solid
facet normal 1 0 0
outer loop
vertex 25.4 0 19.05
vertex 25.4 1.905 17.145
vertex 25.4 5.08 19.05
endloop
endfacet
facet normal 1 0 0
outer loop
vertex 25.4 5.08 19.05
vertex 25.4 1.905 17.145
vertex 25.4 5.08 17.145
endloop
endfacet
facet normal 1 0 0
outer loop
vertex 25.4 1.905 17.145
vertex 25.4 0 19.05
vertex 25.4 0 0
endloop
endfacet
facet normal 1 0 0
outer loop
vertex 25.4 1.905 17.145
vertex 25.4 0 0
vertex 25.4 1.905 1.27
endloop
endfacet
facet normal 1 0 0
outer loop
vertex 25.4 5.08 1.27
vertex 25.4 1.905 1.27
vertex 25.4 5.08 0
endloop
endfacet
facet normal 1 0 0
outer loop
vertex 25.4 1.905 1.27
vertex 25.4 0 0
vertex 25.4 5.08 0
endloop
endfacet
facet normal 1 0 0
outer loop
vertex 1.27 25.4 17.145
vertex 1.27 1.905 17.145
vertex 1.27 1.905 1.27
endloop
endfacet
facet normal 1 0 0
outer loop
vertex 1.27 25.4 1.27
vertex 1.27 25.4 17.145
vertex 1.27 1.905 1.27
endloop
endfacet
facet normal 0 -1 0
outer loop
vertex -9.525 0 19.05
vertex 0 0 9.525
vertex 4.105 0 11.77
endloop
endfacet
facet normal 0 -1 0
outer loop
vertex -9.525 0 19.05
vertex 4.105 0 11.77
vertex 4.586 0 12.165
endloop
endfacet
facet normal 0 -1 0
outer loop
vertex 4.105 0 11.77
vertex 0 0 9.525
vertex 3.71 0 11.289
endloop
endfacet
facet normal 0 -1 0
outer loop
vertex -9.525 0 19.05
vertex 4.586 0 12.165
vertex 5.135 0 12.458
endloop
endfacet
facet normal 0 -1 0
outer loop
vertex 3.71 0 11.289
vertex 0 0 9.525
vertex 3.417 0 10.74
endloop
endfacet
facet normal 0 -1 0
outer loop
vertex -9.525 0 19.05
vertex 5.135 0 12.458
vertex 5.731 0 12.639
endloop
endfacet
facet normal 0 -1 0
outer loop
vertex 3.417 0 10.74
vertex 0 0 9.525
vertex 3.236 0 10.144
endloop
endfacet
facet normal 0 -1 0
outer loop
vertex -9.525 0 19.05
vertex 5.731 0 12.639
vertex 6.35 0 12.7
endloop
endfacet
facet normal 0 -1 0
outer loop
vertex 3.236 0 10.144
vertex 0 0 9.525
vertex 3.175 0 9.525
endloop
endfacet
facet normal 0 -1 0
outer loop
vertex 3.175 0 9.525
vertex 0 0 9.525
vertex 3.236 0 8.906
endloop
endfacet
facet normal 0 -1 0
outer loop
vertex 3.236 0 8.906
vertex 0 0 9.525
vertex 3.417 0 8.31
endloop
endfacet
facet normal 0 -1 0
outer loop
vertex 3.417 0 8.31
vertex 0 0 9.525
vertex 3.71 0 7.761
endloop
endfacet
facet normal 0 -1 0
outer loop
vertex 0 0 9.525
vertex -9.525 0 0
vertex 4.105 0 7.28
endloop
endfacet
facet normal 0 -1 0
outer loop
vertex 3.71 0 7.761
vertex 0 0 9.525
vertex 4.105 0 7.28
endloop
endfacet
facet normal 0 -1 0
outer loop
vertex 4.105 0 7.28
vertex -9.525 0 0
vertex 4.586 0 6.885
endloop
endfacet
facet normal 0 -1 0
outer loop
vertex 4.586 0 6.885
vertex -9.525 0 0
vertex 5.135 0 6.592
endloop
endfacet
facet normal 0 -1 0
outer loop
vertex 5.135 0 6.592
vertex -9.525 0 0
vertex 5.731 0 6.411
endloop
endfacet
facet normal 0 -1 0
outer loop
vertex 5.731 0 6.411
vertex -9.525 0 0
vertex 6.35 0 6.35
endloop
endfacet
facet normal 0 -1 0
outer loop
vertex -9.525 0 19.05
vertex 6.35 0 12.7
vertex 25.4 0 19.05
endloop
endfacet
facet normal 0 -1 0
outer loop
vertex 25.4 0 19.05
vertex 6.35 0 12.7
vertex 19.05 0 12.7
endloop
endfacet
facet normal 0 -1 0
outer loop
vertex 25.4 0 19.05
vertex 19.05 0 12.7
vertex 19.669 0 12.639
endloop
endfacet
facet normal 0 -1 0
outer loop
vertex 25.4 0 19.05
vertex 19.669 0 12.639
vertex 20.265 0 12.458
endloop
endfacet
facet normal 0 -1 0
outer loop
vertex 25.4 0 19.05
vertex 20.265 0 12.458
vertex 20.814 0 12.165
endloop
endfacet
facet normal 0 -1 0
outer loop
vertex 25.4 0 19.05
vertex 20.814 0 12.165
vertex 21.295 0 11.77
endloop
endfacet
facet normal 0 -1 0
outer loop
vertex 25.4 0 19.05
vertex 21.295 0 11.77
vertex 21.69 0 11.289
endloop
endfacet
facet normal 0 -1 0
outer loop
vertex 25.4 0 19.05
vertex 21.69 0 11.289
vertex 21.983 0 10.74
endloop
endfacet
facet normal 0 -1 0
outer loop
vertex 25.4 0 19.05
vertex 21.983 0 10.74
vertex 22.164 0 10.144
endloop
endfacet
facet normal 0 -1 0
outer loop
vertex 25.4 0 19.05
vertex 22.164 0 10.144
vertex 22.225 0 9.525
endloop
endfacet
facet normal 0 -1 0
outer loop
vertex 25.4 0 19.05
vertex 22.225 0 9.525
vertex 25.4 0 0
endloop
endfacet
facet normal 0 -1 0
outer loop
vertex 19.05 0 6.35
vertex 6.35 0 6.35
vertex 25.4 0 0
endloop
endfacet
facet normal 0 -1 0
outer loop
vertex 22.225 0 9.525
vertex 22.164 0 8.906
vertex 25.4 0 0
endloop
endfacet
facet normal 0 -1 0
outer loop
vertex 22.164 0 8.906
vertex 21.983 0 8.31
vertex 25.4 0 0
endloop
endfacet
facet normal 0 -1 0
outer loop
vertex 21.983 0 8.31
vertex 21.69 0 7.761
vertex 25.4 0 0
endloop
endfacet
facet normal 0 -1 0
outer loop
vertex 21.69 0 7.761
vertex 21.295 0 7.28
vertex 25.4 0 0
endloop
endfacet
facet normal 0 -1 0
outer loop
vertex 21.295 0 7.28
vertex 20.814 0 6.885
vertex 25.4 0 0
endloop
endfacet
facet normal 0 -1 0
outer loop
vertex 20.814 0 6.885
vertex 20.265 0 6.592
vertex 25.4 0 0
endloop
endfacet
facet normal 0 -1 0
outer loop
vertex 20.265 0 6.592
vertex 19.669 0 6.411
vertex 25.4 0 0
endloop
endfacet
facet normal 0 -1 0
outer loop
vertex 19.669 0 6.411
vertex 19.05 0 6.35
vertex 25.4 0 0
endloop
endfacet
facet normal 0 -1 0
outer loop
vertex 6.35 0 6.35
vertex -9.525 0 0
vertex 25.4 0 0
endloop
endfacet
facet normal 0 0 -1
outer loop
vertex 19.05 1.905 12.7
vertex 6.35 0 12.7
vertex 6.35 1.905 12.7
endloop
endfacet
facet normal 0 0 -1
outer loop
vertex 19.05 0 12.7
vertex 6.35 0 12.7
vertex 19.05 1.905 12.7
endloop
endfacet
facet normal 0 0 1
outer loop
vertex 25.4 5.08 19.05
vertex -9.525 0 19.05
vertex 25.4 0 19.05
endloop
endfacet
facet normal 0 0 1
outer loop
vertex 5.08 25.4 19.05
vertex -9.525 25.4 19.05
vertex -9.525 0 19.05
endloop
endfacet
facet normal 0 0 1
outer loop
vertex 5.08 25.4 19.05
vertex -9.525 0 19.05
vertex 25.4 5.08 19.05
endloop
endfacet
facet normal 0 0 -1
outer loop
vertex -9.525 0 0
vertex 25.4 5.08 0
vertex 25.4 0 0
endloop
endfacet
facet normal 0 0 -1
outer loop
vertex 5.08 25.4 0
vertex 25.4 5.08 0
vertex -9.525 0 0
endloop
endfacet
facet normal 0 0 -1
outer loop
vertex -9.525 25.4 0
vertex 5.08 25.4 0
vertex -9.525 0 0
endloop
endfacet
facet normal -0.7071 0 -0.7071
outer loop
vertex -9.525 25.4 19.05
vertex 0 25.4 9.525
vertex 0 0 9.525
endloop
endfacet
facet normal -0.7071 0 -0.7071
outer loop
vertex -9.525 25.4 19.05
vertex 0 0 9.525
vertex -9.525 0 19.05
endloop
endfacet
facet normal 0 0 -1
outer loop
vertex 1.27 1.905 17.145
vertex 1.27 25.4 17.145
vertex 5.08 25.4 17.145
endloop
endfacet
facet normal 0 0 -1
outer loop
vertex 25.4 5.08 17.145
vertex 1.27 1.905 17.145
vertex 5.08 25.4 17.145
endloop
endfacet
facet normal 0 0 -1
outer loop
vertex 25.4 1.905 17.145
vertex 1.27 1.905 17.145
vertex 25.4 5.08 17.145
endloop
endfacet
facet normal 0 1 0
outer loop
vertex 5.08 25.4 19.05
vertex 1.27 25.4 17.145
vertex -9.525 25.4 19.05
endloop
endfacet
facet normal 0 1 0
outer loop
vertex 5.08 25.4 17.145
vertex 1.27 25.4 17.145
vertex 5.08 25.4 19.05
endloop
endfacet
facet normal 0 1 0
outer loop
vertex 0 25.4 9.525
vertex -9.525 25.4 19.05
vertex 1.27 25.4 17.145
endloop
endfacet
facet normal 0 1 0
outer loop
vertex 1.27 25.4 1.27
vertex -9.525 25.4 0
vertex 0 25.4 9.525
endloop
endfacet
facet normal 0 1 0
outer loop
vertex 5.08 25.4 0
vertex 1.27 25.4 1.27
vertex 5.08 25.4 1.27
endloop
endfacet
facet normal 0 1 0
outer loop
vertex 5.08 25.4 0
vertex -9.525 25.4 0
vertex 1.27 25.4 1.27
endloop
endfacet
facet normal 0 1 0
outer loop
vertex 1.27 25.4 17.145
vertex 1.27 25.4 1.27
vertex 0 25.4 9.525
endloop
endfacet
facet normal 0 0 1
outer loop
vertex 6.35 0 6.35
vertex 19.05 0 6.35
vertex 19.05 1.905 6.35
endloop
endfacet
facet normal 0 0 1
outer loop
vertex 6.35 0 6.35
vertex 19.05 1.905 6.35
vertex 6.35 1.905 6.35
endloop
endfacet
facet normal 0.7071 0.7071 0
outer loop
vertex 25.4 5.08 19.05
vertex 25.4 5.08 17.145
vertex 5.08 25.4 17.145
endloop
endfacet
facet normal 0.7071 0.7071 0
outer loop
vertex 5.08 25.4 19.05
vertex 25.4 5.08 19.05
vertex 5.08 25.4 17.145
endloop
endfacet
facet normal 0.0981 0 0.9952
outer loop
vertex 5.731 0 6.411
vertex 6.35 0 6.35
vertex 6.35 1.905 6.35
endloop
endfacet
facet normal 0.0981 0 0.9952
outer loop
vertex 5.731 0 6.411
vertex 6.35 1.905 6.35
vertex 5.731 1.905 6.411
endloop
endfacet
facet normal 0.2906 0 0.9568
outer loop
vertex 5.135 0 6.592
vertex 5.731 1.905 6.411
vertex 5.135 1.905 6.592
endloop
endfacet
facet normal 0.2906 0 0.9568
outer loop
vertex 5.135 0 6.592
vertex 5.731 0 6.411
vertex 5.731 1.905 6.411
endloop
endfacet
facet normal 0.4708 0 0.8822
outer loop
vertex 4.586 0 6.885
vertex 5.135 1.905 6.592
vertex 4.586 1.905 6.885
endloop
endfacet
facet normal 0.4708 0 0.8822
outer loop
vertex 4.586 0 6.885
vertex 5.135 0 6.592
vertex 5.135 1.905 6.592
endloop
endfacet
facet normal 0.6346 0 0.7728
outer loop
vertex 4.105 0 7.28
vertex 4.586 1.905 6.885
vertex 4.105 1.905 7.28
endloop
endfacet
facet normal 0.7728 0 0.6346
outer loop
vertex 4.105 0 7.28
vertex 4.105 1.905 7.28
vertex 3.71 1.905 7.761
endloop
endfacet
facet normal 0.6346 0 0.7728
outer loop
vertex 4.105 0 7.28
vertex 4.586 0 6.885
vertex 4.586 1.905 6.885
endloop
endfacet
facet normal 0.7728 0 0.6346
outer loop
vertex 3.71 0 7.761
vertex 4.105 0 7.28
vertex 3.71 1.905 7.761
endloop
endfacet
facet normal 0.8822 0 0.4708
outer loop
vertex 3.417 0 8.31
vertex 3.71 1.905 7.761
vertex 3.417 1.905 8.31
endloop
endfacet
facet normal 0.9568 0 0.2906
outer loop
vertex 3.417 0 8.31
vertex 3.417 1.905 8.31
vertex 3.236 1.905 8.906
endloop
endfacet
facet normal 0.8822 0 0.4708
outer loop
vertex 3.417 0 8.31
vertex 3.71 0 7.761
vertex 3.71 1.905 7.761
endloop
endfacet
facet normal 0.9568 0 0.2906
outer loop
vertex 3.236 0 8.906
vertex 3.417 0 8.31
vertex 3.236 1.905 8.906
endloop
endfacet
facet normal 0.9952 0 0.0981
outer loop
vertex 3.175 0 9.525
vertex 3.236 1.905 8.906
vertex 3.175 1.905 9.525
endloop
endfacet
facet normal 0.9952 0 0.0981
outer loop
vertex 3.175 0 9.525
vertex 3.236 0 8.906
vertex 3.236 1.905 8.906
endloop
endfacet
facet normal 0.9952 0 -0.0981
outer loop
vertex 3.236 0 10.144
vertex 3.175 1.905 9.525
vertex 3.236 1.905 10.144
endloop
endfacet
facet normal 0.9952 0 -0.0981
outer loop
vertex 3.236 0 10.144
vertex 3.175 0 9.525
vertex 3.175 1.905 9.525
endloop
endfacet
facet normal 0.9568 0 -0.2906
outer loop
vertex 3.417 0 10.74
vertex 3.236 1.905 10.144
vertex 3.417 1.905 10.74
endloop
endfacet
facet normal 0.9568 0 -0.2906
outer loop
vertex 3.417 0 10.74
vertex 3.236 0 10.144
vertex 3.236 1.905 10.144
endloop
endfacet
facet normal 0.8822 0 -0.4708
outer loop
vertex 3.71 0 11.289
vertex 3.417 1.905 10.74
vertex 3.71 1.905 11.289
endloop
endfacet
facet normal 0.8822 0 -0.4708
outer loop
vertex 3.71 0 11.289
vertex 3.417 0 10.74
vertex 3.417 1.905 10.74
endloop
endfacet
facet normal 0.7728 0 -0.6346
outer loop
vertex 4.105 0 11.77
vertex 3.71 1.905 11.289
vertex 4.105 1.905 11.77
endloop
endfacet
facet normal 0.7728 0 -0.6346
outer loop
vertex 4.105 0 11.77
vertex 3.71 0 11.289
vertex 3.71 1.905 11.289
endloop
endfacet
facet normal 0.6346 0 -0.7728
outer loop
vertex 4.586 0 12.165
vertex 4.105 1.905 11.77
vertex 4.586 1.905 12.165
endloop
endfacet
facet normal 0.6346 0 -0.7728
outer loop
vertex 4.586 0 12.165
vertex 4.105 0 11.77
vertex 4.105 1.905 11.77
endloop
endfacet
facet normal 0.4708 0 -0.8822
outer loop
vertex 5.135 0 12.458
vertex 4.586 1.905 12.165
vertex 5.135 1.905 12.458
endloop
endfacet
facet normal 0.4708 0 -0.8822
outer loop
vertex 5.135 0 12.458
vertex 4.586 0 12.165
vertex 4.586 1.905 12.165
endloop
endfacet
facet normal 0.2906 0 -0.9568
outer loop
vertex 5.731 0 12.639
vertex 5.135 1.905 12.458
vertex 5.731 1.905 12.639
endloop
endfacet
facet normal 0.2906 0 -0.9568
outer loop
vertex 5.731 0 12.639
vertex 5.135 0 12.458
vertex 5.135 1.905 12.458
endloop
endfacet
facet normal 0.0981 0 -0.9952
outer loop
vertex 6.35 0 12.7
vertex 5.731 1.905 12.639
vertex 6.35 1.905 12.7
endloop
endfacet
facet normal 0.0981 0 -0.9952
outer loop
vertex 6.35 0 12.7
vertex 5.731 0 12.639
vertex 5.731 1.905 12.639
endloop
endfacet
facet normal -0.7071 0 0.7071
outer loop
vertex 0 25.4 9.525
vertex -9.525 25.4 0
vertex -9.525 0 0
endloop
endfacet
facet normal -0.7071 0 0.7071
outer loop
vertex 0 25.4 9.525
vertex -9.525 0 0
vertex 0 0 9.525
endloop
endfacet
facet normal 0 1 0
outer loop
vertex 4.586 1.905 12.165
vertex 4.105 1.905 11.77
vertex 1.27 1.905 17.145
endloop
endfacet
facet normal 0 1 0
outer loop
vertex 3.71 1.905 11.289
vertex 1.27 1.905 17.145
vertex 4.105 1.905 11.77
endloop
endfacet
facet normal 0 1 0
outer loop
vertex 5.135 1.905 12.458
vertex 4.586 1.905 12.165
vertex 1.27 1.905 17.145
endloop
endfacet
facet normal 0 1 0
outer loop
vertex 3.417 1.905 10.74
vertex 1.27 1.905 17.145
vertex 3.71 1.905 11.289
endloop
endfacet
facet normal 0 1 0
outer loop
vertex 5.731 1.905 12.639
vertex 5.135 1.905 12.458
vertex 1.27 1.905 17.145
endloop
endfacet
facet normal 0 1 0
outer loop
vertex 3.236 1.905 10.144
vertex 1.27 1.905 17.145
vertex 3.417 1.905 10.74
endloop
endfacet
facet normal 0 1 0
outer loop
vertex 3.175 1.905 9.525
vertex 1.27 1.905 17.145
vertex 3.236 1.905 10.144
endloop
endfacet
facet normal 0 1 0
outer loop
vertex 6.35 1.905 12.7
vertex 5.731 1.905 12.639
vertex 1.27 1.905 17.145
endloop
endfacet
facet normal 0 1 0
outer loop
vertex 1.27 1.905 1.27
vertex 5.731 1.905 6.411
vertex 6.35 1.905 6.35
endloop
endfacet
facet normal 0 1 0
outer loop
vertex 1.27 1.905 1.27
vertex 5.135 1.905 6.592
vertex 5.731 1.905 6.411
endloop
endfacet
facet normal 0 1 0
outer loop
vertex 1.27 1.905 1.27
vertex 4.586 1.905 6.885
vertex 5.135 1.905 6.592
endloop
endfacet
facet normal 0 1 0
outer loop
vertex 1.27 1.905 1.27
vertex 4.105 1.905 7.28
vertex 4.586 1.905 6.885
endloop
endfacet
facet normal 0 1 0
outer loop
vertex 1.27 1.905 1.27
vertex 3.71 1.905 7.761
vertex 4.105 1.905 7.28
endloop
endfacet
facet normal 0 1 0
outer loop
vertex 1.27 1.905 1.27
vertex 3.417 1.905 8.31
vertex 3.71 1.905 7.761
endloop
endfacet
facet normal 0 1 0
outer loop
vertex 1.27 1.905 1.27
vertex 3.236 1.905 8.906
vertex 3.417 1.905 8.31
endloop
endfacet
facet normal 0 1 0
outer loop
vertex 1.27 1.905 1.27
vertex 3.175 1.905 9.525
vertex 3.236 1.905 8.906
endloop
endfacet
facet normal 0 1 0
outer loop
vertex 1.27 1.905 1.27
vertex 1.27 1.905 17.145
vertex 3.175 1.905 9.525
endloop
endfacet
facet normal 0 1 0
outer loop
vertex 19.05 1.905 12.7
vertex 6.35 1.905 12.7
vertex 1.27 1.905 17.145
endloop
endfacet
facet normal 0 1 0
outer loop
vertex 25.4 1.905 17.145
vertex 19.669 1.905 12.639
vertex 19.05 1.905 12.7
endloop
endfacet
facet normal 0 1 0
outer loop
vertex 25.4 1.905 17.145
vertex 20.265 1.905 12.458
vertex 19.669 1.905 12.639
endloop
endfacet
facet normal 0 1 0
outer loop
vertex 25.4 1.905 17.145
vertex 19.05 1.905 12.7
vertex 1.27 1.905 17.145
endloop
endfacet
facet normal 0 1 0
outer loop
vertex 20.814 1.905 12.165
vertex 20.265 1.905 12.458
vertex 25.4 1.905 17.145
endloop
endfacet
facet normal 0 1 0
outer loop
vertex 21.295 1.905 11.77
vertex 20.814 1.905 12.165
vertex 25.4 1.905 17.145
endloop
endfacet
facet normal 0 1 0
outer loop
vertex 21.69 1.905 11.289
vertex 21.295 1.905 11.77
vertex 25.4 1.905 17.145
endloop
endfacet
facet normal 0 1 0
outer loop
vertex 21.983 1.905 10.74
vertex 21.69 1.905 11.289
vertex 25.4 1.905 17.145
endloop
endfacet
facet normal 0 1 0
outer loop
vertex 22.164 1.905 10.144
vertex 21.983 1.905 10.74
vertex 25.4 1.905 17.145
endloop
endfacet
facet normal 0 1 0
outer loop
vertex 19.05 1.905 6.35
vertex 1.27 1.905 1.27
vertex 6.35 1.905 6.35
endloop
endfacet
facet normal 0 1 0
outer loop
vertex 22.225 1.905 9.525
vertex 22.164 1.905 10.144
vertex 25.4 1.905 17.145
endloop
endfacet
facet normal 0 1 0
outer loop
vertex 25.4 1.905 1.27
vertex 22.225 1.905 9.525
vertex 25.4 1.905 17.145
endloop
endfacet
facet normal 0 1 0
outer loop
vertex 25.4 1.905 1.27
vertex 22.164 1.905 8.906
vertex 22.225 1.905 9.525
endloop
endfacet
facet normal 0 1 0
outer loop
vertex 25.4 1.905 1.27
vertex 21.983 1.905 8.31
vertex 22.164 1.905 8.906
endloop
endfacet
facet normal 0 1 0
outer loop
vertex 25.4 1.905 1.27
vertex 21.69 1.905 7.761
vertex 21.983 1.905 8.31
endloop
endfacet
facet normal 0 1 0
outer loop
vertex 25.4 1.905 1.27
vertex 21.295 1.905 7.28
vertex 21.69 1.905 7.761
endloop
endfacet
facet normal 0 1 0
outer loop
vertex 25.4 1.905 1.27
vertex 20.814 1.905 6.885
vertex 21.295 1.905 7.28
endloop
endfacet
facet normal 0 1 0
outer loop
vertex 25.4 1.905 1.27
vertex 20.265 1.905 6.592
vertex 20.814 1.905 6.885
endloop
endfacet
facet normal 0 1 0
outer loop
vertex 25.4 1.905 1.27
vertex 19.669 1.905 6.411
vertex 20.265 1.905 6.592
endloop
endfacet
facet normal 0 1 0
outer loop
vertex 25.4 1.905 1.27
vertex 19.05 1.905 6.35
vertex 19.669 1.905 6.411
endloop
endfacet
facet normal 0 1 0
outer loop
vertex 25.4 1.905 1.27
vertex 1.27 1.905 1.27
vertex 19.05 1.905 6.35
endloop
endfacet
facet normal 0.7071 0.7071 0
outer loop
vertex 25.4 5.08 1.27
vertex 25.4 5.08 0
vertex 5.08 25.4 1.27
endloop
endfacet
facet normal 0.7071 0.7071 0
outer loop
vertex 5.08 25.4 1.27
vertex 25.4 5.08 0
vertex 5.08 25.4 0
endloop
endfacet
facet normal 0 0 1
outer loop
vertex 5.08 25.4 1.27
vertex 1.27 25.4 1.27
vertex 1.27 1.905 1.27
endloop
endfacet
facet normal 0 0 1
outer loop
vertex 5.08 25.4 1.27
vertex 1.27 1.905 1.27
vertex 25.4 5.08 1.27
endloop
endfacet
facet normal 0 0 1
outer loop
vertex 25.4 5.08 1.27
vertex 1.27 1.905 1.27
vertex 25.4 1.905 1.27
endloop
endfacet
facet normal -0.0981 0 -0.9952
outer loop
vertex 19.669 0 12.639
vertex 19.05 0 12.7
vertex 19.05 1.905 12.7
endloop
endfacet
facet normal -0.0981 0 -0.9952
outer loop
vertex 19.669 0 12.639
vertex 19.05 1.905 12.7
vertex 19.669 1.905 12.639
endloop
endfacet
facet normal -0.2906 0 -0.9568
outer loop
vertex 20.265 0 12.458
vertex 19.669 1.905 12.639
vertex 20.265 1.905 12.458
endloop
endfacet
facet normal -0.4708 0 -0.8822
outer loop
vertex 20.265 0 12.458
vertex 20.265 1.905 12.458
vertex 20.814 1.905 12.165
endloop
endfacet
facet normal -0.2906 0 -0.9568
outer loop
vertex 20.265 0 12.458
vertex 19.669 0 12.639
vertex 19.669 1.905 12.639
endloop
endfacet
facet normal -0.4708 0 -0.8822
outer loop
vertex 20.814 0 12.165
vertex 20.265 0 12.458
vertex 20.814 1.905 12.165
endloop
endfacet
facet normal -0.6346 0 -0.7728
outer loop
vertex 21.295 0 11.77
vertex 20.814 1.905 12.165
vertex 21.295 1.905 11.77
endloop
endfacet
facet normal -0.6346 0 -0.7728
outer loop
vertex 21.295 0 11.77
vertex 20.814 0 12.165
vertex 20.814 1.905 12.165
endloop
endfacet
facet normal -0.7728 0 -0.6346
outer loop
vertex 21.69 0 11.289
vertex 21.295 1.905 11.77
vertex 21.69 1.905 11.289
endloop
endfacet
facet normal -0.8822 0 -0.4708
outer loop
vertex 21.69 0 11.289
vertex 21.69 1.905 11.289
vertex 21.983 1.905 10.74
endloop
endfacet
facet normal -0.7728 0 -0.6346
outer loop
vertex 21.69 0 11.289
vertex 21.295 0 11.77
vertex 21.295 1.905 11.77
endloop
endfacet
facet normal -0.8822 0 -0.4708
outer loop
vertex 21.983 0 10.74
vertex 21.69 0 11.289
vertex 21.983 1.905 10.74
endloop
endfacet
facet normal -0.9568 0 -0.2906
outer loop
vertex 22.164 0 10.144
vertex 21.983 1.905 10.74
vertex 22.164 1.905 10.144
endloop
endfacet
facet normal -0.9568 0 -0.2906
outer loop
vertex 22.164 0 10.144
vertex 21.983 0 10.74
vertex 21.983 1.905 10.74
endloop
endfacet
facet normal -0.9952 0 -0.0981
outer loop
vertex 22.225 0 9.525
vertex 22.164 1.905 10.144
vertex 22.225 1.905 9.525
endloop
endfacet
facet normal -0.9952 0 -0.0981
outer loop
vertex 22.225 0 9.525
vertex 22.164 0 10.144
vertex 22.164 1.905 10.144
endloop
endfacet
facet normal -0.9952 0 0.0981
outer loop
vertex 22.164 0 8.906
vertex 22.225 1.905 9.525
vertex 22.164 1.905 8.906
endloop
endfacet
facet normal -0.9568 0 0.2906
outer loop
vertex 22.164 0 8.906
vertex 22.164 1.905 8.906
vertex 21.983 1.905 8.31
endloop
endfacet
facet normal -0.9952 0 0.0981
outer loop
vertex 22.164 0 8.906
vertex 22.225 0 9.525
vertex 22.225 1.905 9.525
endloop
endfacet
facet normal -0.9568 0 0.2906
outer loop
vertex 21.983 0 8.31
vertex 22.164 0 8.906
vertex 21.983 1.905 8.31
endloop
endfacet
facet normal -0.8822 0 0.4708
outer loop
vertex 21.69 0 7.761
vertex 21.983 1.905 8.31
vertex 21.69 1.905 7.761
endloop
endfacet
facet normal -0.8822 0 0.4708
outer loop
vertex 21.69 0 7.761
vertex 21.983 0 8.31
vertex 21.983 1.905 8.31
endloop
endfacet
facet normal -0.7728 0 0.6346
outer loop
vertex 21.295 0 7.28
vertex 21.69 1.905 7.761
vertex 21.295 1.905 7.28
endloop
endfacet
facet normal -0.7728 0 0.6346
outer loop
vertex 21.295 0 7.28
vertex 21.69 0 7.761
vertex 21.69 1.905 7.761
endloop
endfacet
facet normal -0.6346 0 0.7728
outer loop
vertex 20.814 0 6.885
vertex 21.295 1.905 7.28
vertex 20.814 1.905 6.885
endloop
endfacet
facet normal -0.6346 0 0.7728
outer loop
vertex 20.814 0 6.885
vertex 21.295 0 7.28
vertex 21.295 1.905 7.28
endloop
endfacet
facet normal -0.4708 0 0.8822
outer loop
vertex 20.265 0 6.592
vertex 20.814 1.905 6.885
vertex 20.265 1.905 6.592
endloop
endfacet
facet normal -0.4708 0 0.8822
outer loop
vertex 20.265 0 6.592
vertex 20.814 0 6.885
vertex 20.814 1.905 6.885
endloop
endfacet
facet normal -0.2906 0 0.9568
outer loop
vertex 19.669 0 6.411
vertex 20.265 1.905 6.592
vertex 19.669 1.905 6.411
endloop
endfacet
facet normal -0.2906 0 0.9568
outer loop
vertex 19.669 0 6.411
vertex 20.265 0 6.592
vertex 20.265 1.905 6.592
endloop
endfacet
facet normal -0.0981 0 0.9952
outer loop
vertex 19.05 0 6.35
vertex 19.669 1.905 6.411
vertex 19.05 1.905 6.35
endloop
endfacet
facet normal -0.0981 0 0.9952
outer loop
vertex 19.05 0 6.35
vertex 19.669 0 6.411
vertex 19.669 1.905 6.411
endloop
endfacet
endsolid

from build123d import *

# Parameters (mm, degrees)
BOSS_EXTRUDE1_DEPTH = 19.05
SHELL1_T            = -1.905
CUT_EXTRUDE1_DEPTH  = 1.905
BOSS_EXTRUDE2_DEPTH = 25.4
CUT_EXTRUDE2_START  = -23.495
SKETCH5_W           = 24.13
SKETCH5_H           = 15.875
CUT_EXTRUDE2_DEPTH  = 23.495


with BuildPart() as part:
    # Sketch1 → Boss-Extrude1 (new body)
    with BuildSketch(Plane.XY):
        Polygon((0, 0), (25.4, 0), (25.4, 5.08), (5.08, 25.4), (0, 25.4), align=None)
    extrude(amount=BOSS_EXTRUDE1_DEPTH)

    # Shell1
    shell1_openings = [part.faces().sort_by_distance(p)[0] for p in [
        (15.24, 15.24, 9.525),
    ]]
    offset(amount=SHELL1_T, openings=shell1_openings, kind=Kind.INTERSECTION)

    # Sketch2 → Cut-Extrude1 (cut)
    with BuildSketch(Plane.XZ):
        with BuildLine():
            Line((6.35, 12.7), (19.05, 12.7))
            ThreePointArc((19.05, 12.7), (22.225, 9.525), (19.05, 6.35))
            Line((19.05, 6.35), (6.35, 6.35))
            ThreePointArc((6.35, 6.35), (3.175, 9.525), (6.35, 12.7))
        make_face()
    extrude(amount=-CUT_EXTRUDE1_DEPTH, mode=Mode.SUBTRACT)

    # Sketch3 → Boss-Extrude2 (add)
    with BuildSketch(Plane(origin=(0, 25.4, 0), x_dir=(1, 0, 0), z_dir=(0, 1, 0))):
        Polygon((-9.525, 0), (0, -9.525), (0, 0), align=None)
        Polygon((0, -19.05), (0, -9.525), (-9.525, -19.05), align=None)
    extrude(amount=-BOSS_EXTRUDE2_DEPTH)

    # Sketch5 → Cut-Extrude2 (cut)
    with BuildSketch(Plane(origin=(0, 25.4, 0), x_dir=(1, 0, 0), z_dir=(0, 1, 0)).offset(CUT_EXTRUDE2_START)):
        with Locations((13.335, -9.2075)):
            Rectangle(SKETCH5_W, SKETCH5_H)
    extrude(amount=CUT_EXTRUDE2_DEPTH, mode=Mode.SUBTRACT)


solid = part.part
